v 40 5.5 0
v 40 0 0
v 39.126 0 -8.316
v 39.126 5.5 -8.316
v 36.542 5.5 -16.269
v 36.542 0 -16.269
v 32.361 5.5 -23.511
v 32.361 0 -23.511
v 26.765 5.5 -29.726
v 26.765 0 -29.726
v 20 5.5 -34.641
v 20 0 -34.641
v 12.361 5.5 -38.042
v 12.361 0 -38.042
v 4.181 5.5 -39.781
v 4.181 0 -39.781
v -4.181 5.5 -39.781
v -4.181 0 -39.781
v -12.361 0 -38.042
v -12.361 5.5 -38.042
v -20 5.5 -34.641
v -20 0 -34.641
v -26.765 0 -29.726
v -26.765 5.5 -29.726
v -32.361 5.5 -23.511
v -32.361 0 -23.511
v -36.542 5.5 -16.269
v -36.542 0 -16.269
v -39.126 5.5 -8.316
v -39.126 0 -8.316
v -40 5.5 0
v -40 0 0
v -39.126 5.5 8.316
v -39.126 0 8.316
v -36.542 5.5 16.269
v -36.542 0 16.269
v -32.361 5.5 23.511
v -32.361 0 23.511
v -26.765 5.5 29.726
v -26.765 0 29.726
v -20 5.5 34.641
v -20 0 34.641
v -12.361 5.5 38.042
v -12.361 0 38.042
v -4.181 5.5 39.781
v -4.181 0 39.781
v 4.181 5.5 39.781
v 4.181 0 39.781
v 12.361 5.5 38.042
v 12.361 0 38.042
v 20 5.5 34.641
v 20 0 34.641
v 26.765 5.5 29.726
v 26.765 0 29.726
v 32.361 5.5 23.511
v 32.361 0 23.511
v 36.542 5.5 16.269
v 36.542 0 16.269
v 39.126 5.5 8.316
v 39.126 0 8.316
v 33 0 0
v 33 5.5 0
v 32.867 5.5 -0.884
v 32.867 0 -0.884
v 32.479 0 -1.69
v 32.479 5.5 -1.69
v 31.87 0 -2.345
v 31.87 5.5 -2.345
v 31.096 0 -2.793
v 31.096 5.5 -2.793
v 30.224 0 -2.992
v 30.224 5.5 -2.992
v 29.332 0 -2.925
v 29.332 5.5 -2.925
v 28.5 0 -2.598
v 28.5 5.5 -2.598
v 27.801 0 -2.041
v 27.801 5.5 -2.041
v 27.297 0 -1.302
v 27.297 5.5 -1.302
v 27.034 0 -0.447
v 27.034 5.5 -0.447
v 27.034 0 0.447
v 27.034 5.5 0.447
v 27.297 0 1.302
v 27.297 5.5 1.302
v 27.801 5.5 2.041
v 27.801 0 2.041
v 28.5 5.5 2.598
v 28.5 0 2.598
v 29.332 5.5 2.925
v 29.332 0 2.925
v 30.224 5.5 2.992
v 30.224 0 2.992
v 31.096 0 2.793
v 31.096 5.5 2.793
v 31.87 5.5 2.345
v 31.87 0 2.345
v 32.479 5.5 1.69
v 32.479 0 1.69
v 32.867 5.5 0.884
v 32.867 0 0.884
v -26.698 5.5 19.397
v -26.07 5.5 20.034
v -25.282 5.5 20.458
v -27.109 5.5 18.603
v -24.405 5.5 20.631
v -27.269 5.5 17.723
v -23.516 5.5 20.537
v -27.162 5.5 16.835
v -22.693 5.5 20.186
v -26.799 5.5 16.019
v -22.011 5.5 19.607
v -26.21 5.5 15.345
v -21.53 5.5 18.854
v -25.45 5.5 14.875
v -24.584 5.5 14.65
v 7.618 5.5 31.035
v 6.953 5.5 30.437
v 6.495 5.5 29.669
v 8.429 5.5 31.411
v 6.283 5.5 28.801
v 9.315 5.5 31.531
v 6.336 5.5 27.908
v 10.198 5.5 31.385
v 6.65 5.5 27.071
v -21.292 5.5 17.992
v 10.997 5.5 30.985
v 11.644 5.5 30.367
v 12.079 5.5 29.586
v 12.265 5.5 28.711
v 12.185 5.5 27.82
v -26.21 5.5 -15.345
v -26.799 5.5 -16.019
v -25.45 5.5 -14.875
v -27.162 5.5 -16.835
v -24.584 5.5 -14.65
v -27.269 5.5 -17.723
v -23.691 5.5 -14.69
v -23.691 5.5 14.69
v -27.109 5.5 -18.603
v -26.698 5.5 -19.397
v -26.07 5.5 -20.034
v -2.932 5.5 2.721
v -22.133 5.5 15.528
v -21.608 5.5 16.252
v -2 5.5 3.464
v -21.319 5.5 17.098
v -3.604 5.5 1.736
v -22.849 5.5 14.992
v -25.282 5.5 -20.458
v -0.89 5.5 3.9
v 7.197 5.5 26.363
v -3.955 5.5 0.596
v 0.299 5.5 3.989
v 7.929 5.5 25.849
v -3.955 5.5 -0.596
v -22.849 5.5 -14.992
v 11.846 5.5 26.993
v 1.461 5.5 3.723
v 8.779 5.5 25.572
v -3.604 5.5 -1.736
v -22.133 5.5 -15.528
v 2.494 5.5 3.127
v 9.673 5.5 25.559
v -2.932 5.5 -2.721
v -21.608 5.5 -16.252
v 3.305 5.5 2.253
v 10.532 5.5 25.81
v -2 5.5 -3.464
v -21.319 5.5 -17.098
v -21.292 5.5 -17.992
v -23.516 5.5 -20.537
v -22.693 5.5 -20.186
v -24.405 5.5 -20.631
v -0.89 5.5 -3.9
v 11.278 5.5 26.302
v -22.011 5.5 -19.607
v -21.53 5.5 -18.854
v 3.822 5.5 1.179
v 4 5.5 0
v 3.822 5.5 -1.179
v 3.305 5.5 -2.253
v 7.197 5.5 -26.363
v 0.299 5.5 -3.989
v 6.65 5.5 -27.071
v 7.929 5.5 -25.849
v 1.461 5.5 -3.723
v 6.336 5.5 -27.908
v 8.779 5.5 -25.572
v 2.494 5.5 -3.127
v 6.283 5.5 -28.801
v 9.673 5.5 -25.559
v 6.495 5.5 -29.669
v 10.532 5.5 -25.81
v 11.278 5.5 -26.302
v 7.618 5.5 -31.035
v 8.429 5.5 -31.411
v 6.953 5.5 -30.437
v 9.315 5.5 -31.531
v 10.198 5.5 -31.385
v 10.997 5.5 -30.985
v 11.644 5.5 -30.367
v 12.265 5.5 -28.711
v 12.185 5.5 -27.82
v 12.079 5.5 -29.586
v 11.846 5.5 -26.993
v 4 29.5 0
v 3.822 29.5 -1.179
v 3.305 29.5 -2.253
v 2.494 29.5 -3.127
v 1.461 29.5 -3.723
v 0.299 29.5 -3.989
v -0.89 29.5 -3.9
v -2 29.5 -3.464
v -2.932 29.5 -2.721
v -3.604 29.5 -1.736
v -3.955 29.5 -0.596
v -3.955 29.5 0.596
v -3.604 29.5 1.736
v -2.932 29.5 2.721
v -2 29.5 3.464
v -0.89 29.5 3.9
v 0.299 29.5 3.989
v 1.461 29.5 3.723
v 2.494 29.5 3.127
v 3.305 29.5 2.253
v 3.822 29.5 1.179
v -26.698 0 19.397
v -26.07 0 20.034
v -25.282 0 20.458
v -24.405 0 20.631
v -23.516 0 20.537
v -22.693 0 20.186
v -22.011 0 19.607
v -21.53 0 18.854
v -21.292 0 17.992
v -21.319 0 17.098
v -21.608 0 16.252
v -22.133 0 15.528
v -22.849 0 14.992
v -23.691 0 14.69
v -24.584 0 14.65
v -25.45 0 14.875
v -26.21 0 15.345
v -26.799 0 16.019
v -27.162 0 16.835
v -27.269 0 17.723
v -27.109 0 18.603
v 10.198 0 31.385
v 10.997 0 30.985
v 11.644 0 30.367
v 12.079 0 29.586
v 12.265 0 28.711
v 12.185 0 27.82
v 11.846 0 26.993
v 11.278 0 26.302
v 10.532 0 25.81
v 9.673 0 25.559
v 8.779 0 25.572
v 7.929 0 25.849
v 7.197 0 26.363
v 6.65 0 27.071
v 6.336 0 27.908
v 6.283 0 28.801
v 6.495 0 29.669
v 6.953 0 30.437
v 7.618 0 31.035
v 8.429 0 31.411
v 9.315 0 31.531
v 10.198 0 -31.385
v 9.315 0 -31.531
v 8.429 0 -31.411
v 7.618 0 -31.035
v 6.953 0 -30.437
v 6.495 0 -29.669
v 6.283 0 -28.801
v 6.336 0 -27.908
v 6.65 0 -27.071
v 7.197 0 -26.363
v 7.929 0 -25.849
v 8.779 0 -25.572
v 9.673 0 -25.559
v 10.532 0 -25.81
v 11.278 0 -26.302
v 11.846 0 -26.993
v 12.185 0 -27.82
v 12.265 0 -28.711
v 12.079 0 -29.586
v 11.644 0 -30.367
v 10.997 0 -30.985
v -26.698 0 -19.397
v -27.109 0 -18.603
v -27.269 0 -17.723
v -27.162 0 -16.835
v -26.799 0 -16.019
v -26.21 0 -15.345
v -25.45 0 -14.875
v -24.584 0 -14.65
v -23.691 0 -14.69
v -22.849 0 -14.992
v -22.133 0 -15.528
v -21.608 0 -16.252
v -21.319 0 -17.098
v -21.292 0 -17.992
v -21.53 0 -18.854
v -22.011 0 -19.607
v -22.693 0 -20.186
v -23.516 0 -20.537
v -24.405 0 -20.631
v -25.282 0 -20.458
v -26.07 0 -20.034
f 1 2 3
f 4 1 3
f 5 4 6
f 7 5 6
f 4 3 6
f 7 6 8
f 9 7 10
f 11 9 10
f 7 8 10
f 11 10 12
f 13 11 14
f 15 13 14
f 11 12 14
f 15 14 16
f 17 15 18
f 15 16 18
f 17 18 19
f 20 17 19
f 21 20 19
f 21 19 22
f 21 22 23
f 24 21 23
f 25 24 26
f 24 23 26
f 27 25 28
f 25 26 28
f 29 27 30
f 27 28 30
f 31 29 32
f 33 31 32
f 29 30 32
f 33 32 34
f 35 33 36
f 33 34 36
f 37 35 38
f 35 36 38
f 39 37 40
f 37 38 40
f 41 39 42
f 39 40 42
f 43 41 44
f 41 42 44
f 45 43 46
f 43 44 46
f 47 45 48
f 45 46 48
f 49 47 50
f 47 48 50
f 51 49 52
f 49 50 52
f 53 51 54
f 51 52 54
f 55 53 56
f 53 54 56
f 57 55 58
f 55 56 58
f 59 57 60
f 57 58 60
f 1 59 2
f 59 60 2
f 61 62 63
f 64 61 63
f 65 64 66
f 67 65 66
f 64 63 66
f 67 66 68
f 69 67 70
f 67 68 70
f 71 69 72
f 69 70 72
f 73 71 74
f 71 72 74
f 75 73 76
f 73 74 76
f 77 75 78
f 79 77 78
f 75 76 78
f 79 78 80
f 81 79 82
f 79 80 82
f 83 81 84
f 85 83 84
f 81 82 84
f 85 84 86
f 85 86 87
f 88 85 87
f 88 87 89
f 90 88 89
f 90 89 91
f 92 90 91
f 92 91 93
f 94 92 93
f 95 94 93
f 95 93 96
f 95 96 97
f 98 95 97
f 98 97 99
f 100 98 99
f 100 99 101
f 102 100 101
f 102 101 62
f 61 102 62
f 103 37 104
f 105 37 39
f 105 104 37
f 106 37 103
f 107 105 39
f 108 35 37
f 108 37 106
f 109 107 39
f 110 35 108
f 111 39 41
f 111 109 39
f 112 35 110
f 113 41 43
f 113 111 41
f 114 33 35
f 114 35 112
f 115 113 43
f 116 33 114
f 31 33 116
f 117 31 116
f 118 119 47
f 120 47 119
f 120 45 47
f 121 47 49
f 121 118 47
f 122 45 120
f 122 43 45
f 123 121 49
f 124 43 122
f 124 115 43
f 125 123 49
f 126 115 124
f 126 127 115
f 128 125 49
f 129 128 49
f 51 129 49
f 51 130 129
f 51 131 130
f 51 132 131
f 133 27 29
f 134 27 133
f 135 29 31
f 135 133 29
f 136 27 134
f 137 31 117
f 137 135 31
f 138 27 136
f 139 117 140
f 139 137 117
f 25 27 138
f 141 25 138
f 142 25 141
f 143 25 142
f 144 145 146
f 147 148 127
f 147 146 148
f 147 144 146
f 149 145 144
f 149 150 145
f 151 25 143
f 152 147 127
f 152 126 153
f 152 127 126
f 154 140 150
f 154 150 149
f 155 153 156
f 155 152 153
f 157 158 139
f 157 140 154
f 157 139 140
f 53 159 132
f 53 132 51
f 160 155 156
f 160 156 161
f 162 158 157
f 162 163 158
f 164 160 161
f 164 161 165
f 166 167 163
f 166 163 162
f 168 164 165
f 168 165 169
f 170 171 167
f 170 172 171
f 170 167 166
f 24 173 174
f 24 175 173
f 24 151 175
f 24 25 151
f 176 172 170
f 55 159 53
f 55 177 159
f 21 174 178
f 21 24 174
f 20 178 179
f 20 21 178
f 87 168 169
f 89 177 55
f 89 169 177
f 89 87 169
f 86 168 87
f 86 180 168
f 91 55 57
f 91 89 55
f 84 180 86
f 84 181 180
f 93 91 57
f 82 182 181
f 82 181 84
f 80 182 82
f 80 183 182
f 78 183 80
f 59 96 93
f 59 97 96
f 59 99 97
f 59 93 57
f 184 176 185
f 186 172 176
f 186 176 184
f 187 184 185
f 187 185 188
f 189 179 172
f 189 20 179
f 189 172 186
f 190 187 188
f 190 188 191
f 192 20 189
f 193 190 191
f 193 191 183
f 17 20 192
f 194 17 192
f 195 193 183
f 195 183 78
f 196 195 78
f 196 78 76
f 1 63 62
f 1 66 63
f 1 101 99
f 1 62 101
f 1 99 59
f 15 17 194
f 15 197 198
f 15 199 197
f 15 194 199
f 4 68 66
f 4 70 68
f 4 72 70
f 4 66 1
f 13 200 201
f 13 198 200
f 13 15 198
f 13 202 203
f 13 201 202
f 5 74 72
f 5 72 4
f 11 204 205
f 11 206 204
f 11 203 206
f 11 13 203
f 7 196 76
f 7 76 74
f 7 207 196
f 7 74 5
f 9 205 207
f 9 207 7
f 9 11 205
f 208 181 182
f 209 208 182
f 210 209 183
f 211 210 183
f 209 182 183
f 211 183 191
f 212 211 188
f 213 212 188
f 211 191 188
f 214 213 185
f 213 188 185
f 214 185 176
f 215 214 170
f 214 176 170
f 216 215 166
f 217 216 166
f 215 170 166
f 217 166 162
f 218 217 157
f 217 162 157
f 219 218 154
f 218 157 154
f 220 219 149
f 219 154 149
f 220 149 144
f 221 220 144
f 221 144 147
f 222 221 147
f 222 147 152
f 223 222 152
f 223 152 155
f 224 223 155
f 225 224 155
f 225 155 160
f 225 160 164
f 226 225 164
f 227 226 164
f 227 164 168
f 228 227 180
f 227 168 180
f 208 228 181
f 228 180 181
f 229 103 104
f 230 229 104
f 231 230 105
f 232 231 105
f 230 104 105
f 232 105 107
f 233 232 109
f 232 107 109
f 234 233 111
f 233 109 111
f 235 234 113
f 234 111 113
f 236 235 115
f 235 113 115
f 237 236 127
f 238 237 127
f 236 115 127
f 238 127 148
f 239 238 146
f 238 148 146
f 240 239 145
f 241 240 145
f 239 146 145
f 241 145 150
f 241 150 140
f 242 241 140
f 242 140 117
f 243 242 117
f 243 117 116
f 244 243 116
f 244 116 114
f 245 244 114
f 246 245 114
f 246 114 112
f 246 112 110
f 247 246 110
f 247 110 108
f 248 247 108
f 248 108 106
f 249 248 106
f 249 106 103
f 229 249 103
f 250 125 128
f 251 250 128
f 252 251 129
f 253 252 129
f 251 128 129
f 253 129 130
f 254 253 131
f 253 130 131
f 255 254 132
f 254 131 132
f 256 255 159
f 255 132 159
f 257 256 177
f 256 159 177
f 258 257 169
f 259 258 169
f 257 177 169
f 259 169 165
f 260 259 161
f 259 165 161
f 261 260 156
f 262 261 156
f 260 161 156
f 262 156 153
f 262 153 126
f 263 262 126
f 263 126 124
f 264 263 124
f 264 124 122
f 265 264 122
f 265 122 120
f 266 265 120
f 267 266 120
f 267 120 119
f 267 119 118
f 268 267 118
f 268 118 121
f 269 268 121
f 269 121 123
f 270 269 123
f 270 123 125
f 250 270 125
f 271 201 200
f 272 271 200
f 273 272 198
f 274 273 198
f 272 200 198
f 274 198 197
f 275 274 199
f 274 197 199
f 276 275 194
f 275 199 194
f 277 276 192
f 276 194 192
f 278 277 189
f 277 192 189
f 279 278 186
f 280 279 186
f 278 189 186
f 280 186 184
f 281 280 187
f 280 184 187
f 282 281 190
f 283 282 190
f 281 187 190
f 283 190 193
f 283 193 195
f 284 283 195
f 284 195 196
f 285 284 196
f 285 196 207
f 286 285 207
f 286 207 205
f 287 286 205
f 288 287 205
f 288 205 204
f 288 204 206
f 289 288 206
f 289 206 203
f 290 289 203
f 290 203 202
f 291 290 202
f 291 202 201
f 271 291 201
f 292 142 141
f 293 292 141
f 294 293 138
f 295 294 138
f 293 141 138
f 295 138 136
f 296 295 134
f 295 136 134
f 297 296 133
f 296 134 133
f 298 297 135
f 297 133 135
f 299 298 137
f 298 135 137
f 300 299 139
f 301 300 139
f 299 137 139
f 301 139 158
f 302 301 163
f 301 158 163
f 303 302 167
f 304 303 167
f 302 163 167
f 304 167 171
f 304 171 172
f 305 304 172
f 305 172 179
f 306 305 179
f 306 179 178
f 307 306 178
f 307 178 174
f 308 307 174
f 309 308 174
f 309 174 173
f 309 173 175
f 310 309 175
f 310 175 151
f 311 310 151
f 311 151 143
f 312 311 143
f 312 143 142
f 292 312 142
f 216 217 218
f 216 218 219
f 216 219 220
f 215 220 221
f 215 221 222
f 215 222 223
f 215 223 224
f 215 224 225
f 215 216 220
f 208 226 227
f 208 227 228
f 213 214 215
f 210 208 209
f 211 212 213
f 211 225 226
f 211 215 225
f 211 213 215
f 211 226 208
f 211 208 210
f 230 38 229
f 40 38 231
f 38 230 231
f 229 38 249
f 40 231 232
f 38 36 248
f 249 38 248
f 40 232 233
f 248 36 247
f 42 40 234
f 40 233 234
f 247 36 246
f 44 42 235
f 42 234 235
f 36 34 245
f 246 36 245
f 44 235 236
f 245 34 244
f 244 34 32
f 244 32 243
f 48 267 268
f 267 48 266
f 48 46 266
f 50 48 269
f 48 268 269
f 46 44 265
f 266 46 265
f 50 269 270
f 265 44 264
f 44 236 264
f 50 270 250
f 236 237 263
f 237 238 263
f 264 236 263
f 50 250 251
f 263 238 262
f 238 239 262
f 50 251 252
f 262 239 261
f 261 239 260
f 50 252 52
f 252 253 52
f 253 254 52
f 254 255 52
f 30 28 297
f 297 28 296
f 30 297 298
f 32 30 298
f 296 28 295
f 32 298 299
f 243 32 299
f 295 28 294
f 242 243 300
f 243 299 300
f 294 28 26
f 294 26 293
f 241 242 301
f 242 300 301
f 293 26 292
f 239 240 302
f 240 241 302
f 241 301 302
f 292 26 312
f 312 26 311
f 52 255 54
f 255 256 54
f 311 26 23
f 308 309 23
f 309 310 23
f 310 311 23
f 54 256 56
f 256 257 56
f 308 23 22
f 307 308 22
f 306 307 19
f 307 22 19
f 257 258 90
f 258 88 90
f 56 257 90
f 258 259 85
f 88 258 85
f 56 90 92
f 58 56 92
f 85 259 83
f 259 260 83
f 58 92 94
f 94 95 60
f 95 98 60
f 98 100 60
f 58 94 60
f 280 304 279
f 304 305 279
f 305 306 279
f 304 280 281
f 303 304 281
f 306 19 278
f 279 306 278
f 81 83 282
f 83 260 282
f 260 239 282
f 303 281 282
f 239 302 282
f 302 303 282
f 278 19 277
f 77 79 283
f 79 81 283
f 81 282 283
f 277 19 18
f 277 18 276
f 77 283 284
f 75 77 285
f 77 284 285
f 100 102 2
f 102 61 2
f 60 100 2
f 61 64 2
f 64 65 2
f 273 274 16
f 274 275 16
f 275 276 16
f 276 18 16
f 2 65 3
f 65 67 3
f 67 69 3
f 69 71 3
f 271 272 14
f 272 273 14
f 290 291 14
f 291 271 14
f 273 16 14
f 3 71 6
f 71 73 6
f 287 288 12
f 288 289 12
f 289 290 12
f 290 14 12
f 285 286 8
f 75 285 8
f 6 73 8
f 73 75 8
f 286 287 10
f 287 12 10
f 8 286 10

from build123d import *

# Parameters (mm, degrees)
SKETCH1_R           = 40
BOSS_EXTRUDE1_DEPTH = 5.5
SKETCH2_R           = 3
CUT_EXTRUDE1_DEPTH  = 6.5
CIRPATTERN1_COUNT   = 5
SKETCH3_R           = 4
BOSS_EXTRUDE2_DEPTH = 24


with BuildPart() as part:
    # Sketch1 → Boss-Extrude1 (new body)
    with BuildSketch(Plane(origin=(0, 0, 0), x_dir=(1, 0, 0), z_dir=(0, 1, 0))):
        Circle(SKETCH1_R)
    extrude(amount=BOSS_EXTRUDE1_DEPTH)

    # Sketch2 → Cut-Extrude1 (cut, through all)
    with BuildSketch(Plane(origin=(0, 5.5, 0), x_dir=(1, 0, 0), z_dir=(0, 1, 0))):
        with Locations((30, 0)):
            Circle(SKETCH2_R)
    cut_extrude1 = extrude(amount=-CUT_EXTRUDE1_DEPTH, mode=Mode.SUBTRACT)

    # CirPattern1: Cut-Extrude1 ×5 about axis
    cirpattern1_axis = Axis((0, 0, 0), (0, 1, 0))
    for i in range(1, CIRPATTERN1_COUNT):
        add(cut_extrude1.rotate(cirpattern1_axis, i * 360 / CIRPATTERN1_COUNT), mode=Mode.SUBTRACT)

    # Sketch3 → Boss-Extrude2 (add)
    with BuildSketch(Plane(origin=(0, 5.5, 0), x_dir=(1, 0, 0), z_dir=(0, 1, 0))):
        Circle(SKETCH3_R)
    extrude(amount=BOSS_EXTRUDE2_DEPTH)


solid = part.part
